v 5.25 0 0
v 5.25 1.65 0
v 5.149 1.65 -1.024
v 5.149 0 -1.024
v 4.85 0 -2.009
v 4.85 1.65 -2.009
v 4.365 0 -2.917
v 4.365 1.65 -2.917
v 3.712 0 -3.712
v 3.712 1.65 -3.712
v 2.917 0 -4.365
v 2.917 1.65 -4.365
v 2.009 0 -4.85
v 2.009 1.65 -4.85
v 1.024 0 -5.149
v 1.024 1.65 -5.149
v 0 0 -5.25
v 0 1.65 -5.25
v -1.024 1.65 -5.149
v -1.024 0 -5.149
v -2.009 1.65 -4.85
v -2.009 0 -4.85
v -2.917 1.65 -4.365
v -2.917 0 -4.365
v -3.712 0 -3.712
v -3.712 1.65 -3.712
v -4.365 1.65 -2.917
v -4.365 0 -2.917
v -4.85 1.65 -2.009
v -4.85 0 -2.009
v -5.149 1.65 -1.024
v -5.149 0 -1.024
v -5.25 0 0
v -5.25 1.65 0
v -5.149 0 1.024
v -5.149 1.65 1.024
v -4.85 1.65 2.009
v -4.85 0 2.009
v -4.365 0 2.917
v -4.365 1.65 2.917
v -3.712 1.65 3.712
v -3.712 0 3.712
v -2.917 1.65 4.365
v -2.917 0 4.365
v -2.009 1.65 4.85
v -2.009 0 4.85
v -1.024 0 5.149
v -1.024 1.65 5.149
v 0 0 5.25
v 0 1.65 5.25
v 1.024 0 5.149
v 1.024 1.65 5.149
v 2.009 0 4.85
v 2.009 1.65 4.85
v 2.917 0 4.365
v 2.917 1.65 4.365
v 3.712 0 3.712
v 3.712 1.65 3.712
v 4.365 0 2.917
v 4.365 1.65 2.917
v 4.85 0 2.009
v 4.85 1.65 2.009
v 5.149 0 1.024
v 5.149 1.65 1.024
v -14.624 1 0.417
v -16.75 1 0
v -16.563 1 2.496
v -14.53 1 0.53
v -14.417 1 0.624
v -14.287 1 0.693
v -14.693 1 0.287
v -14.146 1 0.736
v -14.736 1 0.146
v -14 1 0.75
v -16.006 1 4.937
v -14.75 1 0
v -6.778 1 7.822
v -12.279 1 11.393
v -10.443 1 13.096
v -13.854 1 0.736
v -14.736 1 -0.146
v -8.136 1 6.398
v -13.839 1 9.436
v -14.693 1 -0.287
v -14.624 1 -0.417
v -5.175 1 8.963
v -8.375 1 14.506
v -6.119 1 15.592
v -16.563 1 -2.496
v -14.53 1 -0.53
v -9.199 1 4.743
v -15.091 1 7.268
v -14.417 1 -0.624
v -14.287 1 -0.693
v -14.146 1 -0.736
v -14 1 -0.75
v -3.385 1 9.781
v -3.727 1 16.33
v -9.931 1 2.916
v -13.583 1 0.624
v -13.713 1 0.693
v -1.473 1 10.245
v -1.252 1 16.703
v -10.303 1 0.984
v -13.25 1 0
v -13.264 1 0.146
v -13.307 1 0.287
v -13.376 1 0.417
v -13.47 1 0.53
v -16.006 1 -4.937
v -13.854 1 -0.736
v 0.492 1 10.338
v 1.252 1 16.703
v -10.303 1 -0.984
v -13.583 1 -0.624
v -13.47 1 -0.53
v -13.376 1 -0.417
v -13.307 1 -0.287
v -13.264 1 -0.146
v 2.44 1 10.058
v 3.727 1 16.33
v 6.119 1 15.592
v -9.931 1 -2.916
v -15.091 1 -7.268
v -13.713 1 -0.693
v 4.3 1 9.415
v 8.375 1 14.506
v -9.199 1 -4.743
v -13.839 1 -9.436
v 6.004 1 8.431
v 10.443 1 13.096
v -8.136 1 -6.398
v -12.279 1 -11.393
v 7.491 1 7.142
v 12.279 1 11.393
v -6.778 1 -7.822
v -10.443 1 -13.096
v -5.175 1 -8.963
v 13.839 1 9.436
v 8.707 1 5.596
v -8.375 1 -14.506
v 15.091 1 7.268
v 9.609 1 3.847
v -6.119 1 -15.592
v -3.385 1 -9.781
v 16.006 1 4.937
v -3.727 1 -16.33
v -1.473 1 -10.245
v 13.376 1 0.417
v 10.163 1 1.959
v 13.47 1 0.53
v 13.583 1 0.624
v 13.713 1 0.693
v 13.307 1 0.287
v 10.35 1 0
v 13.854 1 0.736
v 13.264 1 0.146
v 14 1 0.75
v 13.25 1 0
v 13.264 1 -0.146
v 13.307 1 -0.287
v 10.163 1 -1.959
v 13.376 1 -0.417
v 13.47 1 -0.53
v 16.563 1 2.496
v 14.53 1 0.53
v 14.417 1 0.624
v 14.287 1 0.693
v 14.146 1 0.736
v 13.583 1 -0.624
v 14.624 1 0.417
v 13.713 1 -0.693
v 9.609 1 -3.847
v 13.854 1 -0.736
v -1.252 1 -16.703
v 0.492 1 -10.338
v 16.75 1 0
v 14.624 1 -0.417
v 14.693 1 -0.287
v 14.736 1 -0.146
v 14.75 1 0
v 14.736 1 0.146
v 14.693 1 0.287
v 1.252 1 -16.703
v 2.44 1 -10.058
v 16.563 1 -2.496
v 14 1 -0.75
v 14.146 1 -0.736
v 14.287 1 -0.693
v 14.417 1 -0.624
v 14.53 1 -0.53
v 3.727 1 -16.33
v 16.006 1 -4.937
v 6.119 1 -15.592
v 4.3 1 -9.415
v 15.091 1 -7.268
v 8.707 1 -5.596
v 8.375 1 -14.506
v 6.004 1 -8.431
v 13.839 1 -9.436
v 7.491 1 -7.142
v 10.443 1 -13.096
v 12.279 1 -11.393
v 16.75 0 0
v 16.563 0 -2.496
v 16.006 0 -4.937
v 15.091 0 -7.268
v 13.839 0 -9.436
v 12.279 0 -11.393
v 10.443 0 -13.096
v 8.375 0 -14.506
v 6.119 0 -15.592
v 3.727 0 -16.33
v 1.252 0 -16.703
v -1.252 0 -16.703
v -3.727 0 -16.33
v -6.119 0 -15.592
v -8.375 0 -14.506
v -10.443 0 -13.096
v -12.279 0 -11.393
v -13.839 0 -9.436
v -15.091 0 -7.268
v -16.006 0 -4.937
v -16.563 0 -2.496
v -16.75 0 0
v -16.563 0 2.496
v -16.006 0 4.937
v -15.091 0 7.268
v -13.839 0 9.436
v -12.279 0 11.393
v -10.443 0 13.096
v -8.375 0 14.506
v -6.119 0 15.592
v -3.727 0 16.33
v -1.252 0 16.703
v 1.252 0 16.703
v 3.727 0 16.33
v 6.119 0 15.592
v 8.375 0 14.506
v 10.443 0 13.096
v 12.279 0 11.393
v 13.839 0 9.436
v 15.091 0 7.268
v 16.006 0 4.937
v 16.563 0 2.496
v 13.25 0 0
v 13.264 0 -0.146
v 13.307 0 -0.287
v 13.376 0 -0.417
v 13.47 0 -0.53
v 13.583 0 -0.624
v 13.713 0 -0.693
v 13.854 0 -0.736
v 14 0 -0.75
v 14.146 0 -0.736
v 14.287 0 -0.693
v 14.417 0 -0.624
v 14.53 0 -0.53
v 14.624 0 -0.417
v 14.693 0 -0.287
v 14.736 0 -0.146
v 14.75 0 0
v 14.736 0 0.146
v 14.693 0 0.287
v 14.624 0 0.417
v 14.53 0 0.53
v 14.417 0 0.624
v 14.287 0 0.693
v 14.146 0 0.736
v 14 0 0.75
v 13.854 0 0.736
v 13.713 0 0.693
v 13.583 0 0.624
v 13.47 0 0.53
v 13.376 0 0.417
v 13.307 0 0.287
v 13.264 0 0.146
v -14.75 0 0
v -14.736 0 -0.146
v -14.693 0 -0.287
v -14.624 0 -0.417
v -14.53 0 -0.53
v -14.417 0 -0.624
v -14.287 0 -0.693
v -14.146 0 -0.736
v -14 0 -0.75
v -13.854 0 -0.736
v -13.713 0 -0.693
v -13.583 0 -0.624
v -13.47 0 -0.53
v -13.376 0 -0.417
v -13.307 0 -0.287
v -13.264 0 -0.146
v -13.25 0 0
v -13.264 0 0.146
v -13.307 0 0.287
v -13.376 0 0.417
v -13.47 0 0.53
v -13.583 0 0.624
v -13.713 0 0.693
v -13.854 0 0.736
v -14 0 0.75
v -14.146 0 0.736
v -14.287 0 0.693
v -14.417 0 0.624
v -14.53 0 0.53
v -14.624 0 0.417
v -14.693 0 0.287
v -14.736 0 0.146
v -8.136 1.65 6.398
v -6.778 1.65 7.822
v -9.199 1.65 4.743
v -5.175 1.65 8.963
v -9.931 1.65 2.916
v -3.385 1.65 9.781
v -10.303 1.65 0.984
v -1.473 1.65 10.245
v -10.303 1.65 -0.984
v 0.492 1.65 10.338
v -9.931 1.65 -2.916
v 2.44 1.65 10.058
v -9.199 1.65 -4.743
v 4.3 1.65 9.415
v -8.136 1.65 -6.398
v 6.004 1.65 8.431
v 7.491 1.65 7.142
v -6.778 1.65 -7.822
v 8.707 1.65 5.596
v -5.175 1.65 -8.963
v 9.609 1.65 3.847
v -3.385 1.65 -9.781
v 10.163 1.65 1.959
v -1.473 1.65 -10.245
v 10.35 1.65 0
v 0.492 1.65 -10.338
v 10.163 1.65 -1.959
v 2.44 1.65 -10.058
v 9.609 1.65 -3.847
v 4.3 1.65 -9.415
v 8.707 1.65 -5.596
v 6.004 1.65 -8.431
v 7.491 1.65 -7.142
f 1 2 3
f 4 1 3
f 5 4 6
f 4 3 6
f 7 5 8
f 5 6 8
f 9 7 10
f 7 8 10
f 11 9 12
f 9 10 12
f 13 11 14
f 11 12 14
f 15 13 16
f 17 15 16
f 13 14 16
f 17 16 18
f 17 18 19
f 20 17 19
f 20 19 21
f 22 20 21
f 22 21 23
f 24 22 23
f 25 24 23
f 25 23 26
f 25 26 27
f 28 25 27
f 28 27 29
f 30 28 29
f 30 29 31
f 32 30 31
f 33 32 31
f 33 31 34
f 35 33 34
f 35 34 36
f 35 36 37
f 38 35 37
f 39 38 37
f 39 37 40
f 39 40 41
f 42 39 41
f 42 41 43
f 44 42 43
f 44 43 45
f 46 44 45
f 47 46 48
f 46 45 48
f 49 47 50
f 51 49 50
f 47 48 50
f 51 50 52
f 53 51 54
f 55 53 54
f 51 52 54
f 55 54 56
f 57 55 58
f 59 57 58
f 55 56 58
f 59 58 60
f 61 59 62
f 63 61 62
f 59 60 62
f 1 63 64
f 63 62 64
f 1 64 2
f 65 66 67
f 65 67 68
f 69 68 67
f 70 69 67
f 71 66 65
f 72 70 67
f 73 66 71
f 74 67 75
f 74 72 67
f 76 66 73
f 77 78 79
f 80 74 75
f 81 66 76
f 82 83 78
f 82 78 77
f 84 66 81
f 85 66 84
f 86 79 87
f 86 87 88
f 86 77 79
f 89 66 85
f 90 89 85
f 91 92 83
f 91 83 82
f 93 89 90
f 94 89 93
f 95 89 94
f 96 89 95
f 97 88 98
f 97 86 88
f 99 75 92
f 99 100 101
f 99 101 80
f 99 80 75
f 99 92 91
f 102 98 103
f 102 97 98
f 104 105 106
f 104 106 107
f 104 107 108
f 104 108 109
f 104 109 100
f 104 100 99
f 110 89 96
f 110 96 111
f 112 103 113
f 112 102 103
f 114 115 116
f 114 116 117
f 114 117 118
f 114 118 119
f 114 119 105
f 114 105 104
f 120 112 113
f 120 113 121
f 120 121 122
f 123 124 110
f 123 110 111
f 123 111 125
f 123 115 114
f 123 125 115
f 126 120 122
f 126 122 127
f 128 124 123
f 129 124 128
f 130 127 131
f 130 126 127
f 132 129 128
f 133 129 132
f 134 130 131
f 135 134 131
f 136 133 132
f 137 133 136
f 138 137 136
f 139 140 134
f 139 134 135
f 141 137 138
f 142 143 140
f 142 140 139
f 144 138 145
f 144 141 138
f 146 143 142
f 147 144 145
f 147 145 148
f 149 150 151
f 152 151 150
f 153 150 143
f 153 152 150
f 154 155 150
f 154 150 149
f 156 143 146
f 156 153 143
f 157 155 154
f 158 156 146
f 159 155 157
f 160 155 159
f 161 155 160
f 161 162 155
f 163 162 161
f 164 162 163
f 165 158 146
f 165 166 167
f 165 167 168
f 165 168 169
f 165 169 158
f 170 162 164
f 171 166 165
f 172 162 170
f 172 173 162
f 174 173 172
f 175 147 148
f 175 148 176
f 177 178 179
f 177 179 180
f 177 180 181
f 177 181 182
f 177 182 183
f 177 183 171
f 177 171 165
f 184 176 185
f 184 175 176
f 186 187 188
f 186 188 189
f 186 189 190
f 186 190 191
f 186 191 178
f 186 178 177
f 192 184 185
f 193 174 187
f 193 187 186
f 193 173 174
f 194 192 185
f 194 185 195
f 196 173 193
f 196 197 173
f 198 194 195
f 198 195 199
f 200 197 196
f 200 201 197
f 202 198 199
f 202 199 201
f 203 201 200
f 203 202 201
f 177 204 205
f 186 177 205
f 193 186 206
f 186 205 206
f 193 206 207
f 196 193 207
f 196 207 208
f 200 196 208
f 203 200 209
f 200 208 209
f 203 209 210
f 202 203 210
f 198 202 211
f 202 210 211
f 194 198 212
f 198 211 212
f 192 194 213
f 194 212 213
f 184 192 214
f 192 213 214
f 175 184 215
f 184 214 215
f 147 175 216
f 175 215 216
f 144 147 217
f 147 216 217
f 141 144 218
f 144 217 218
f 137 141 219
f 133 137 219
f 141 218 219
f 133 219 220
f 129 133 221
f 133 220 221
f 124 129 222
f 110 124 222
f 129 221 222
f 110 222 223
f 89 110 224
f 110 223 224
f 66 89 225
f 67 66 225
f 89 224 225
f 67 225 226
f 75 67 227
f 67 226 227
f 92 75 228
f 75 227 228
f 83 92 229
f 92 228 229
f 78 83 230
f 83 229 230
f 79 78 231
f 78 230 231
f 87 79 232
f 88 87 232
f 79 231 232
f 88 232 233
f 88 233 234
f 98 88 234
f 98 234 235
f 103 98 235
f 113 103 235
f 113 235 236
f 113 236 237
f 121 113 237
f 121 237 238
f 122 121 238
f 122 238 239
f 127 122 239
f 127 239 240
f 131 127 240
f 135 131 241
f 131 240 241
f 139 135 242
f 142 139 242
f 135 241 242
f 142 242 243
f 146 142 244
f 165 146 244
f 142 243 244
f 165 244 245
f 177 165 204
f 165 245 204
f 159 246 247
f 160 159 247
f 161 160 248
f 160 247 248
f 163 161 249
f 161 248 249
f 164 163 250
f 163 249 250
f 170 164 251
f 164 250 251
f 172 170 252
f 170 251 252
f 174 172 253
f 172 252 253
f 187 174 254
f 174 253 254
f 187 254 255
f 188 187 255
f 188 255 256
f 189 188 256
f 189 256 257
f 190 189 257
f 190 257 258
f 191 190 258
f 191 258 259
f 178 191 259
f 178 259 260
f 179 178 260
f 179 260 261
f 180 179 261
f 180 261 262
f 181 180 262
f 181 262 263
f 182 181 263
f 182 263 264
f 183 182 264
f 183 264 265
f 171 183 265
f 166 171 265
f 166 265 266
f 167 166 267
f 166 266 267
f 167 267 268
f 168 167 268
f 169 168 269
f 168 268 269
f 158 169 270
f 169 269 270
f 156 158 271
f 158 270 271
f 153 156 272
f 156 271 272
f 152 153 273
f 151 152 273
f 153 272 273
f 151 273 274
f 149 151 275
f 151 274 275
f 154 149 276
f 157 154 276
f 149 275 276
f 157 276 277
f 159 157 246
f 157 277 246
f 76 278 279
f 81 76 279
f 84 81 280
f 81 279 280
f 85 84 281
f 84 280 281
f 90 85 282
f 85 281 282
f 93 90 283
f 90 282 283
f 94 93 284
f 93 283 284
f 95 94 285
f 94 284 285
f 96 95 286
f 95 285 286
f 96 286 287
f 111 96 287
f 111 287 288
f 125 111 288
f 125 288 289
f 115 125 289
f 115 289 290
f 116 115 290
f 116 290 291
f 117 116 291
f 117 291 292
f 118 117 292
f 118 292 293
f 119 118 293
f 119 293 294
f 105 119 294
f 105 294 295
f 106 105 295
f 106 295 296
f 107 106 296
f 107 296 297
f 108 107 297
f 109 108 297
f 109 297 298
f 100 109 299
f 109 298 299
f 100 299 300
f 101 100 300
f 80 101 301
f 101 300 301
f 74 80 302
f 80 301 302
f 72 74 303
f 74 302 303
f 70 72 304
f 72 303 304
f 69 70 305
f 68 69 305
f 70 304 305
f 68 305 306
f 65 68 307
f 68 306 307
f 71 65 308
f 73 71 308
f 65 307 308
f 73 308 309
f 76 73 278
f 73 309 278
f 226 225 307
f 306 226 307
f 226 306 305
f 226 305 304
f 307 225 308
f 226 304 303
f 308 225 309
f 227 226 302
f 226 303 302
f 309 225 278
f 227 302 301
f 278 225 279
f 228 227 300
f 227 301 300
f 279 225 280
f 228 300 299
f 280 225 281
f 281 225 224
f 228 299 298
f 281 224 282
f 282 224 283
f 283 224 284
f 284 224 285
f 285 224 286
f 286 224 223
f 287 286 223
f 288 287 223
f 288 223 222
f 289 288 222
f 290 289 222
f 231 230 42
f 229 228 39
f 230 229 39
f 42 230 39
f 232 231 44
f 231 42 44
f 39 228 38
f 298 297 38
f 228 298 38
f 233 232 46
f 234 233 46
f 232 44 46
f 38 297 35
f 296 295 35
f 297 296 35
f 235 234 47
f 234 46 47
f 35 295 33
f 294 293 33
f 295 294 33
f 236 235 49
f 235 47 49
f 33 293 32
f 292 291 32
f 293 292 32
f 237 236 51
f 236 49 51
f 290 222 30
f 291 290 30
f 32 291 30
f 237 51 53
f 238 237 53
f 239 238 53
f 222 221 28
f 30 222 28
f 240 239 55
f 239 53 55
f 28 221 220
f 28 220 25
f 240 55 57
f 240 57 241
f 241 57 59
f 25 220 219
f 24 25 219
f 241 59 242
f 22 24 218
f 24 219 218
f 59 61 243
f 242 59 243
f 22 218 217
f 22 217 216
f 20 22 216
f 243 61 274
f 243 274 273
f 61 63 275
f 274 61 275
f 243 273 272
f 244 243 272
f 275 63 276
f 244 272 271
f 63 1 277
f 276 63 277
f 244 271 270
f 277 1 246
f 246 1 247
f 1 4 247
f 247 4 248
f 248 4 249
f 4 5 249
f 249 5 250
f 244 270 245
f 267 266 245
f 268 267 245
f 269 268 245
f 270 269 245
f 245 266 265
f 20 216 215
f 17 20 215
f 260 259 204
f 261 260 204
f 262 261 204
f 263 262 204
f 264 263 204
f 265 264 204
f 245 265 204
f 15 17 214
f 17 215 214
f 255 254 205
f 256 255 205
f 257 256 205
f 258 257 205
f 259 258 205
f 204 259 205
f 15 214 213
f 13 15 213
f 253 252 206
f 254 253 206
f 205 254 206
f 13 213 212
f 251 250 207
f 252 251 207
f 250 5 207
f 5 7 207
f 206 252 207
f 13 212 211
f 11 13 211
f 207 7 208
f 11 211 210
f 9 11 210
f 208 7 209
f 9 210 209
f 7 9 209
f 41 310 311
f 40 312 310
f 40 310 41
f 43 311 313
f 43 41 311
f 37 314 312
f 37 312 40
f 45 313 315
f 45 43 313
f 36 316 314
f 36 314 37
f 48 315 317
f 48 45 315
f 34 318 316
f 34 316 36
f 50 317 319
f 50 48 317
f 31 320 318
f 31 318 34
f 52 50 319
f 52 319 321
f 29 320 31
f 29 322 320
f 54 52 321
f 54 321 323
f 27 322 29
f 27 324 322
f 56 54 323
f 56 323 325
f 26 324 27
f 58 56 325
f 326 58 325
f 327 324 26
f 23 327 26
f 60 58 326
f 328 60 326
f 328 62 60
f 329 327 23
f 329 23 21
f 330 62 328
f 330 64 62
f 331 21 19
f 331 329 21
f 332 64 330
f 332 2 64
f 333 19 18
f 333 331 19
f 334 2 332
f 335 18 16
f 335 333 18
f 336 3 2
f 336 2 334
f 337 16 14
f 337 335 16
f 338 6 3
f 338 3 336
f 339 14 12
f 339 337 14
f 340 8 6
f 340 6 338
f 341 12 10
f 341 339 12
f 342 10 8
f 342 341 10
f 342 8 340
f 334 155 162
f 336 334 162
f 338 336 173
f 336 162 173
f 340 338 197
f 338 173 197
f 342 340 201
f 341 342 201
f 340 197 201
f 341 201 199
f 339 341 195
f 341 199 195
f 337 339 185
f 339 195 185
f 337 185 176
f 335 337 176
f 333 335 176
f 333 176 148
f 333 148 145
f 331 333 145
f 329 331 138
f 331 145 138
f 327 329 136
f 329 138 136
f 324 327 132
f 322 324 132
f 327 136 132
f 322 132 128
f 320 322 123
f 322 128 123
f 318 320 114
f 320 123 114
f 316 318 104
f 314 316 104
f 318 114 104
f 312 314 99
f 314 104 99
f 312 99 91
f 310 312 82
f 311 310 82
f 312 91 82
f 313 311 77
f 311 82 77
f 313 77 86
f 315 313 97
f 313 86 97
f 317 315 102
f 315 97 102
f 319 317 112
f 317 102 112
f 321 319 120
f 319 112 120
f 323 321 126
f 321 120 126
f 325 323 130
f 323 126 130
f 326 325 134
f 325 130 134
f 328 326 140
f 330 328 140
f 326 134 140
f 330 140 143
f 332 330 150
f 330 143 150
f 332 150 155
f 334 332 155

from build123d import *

# Parameters (mm, degrees)
SKETCH_1_R          = 16.75
EXTRUDE_1_DEPTH     = 1
SKETCH_2_R          = 10.35
EXTRUDE_2_DEPTH     = 0.65
SKETCH_3_R          = 5.25
CUT_EXTRUDE_1_DEPTH = 2.65
SKETCH_4_R          = 0.7499985
CUT_EXTRUDE_2_DEPTH = 2.65


with BuildPart() as part:
    # Эскиз1 → Бобышка-Вытянуть1 (new body)
    with BuildSketch(Plane(origin=(0, 0, 0), x_dir=(1, 0, 0), z_dir=(0, 1, 0))):
        Circle(SKETCH_1_R)
    extrude(amount=EXTRUDE_1_DEPTH)

    # Эскиз2 → Бобышка-Вытянуть2 (add)
    with BuildSketch(Plane(origin=(0, 1, 0), x_dir=(1, 0, 0), z_dir=(0, 1, 0))):
        Circle(SKETCH_2_R)
    extrude(amount=EXTRUDE_2_DEPTH)

    # Эскиз3 → Вырез-Вытянуть1 (cut, through all)
    with BuildSketch(Plane(origin=(0, 1.65, 0), x_dir=(1, 0, 0), z_dir=(0, 1, 0))):
        Circle(SKETCH_3_R)
    extrude(amount=-CUT_EXTRUDE_1_DEPTH, mode=Mode.SUBTRACT)

    # Эскиз4 → Вырез-Вытянуть2 (cut, through all)
    with BuildSketch(Plane(origin=(0, 0, 0), x_dir=(-1, 0, 0), z_dir=(0, -1, 0))):
        with Locations((-14.0000228, 0)):
            Circle(SKETCH_4_R)
        with Locations((13.999972, 0)):
            Circle(SKETCH_4_R)
    extrude(amount=-CUT_EXTRUDE_2_DEPTH, mode=Mode.SUBTRACT)


solid = part.part
